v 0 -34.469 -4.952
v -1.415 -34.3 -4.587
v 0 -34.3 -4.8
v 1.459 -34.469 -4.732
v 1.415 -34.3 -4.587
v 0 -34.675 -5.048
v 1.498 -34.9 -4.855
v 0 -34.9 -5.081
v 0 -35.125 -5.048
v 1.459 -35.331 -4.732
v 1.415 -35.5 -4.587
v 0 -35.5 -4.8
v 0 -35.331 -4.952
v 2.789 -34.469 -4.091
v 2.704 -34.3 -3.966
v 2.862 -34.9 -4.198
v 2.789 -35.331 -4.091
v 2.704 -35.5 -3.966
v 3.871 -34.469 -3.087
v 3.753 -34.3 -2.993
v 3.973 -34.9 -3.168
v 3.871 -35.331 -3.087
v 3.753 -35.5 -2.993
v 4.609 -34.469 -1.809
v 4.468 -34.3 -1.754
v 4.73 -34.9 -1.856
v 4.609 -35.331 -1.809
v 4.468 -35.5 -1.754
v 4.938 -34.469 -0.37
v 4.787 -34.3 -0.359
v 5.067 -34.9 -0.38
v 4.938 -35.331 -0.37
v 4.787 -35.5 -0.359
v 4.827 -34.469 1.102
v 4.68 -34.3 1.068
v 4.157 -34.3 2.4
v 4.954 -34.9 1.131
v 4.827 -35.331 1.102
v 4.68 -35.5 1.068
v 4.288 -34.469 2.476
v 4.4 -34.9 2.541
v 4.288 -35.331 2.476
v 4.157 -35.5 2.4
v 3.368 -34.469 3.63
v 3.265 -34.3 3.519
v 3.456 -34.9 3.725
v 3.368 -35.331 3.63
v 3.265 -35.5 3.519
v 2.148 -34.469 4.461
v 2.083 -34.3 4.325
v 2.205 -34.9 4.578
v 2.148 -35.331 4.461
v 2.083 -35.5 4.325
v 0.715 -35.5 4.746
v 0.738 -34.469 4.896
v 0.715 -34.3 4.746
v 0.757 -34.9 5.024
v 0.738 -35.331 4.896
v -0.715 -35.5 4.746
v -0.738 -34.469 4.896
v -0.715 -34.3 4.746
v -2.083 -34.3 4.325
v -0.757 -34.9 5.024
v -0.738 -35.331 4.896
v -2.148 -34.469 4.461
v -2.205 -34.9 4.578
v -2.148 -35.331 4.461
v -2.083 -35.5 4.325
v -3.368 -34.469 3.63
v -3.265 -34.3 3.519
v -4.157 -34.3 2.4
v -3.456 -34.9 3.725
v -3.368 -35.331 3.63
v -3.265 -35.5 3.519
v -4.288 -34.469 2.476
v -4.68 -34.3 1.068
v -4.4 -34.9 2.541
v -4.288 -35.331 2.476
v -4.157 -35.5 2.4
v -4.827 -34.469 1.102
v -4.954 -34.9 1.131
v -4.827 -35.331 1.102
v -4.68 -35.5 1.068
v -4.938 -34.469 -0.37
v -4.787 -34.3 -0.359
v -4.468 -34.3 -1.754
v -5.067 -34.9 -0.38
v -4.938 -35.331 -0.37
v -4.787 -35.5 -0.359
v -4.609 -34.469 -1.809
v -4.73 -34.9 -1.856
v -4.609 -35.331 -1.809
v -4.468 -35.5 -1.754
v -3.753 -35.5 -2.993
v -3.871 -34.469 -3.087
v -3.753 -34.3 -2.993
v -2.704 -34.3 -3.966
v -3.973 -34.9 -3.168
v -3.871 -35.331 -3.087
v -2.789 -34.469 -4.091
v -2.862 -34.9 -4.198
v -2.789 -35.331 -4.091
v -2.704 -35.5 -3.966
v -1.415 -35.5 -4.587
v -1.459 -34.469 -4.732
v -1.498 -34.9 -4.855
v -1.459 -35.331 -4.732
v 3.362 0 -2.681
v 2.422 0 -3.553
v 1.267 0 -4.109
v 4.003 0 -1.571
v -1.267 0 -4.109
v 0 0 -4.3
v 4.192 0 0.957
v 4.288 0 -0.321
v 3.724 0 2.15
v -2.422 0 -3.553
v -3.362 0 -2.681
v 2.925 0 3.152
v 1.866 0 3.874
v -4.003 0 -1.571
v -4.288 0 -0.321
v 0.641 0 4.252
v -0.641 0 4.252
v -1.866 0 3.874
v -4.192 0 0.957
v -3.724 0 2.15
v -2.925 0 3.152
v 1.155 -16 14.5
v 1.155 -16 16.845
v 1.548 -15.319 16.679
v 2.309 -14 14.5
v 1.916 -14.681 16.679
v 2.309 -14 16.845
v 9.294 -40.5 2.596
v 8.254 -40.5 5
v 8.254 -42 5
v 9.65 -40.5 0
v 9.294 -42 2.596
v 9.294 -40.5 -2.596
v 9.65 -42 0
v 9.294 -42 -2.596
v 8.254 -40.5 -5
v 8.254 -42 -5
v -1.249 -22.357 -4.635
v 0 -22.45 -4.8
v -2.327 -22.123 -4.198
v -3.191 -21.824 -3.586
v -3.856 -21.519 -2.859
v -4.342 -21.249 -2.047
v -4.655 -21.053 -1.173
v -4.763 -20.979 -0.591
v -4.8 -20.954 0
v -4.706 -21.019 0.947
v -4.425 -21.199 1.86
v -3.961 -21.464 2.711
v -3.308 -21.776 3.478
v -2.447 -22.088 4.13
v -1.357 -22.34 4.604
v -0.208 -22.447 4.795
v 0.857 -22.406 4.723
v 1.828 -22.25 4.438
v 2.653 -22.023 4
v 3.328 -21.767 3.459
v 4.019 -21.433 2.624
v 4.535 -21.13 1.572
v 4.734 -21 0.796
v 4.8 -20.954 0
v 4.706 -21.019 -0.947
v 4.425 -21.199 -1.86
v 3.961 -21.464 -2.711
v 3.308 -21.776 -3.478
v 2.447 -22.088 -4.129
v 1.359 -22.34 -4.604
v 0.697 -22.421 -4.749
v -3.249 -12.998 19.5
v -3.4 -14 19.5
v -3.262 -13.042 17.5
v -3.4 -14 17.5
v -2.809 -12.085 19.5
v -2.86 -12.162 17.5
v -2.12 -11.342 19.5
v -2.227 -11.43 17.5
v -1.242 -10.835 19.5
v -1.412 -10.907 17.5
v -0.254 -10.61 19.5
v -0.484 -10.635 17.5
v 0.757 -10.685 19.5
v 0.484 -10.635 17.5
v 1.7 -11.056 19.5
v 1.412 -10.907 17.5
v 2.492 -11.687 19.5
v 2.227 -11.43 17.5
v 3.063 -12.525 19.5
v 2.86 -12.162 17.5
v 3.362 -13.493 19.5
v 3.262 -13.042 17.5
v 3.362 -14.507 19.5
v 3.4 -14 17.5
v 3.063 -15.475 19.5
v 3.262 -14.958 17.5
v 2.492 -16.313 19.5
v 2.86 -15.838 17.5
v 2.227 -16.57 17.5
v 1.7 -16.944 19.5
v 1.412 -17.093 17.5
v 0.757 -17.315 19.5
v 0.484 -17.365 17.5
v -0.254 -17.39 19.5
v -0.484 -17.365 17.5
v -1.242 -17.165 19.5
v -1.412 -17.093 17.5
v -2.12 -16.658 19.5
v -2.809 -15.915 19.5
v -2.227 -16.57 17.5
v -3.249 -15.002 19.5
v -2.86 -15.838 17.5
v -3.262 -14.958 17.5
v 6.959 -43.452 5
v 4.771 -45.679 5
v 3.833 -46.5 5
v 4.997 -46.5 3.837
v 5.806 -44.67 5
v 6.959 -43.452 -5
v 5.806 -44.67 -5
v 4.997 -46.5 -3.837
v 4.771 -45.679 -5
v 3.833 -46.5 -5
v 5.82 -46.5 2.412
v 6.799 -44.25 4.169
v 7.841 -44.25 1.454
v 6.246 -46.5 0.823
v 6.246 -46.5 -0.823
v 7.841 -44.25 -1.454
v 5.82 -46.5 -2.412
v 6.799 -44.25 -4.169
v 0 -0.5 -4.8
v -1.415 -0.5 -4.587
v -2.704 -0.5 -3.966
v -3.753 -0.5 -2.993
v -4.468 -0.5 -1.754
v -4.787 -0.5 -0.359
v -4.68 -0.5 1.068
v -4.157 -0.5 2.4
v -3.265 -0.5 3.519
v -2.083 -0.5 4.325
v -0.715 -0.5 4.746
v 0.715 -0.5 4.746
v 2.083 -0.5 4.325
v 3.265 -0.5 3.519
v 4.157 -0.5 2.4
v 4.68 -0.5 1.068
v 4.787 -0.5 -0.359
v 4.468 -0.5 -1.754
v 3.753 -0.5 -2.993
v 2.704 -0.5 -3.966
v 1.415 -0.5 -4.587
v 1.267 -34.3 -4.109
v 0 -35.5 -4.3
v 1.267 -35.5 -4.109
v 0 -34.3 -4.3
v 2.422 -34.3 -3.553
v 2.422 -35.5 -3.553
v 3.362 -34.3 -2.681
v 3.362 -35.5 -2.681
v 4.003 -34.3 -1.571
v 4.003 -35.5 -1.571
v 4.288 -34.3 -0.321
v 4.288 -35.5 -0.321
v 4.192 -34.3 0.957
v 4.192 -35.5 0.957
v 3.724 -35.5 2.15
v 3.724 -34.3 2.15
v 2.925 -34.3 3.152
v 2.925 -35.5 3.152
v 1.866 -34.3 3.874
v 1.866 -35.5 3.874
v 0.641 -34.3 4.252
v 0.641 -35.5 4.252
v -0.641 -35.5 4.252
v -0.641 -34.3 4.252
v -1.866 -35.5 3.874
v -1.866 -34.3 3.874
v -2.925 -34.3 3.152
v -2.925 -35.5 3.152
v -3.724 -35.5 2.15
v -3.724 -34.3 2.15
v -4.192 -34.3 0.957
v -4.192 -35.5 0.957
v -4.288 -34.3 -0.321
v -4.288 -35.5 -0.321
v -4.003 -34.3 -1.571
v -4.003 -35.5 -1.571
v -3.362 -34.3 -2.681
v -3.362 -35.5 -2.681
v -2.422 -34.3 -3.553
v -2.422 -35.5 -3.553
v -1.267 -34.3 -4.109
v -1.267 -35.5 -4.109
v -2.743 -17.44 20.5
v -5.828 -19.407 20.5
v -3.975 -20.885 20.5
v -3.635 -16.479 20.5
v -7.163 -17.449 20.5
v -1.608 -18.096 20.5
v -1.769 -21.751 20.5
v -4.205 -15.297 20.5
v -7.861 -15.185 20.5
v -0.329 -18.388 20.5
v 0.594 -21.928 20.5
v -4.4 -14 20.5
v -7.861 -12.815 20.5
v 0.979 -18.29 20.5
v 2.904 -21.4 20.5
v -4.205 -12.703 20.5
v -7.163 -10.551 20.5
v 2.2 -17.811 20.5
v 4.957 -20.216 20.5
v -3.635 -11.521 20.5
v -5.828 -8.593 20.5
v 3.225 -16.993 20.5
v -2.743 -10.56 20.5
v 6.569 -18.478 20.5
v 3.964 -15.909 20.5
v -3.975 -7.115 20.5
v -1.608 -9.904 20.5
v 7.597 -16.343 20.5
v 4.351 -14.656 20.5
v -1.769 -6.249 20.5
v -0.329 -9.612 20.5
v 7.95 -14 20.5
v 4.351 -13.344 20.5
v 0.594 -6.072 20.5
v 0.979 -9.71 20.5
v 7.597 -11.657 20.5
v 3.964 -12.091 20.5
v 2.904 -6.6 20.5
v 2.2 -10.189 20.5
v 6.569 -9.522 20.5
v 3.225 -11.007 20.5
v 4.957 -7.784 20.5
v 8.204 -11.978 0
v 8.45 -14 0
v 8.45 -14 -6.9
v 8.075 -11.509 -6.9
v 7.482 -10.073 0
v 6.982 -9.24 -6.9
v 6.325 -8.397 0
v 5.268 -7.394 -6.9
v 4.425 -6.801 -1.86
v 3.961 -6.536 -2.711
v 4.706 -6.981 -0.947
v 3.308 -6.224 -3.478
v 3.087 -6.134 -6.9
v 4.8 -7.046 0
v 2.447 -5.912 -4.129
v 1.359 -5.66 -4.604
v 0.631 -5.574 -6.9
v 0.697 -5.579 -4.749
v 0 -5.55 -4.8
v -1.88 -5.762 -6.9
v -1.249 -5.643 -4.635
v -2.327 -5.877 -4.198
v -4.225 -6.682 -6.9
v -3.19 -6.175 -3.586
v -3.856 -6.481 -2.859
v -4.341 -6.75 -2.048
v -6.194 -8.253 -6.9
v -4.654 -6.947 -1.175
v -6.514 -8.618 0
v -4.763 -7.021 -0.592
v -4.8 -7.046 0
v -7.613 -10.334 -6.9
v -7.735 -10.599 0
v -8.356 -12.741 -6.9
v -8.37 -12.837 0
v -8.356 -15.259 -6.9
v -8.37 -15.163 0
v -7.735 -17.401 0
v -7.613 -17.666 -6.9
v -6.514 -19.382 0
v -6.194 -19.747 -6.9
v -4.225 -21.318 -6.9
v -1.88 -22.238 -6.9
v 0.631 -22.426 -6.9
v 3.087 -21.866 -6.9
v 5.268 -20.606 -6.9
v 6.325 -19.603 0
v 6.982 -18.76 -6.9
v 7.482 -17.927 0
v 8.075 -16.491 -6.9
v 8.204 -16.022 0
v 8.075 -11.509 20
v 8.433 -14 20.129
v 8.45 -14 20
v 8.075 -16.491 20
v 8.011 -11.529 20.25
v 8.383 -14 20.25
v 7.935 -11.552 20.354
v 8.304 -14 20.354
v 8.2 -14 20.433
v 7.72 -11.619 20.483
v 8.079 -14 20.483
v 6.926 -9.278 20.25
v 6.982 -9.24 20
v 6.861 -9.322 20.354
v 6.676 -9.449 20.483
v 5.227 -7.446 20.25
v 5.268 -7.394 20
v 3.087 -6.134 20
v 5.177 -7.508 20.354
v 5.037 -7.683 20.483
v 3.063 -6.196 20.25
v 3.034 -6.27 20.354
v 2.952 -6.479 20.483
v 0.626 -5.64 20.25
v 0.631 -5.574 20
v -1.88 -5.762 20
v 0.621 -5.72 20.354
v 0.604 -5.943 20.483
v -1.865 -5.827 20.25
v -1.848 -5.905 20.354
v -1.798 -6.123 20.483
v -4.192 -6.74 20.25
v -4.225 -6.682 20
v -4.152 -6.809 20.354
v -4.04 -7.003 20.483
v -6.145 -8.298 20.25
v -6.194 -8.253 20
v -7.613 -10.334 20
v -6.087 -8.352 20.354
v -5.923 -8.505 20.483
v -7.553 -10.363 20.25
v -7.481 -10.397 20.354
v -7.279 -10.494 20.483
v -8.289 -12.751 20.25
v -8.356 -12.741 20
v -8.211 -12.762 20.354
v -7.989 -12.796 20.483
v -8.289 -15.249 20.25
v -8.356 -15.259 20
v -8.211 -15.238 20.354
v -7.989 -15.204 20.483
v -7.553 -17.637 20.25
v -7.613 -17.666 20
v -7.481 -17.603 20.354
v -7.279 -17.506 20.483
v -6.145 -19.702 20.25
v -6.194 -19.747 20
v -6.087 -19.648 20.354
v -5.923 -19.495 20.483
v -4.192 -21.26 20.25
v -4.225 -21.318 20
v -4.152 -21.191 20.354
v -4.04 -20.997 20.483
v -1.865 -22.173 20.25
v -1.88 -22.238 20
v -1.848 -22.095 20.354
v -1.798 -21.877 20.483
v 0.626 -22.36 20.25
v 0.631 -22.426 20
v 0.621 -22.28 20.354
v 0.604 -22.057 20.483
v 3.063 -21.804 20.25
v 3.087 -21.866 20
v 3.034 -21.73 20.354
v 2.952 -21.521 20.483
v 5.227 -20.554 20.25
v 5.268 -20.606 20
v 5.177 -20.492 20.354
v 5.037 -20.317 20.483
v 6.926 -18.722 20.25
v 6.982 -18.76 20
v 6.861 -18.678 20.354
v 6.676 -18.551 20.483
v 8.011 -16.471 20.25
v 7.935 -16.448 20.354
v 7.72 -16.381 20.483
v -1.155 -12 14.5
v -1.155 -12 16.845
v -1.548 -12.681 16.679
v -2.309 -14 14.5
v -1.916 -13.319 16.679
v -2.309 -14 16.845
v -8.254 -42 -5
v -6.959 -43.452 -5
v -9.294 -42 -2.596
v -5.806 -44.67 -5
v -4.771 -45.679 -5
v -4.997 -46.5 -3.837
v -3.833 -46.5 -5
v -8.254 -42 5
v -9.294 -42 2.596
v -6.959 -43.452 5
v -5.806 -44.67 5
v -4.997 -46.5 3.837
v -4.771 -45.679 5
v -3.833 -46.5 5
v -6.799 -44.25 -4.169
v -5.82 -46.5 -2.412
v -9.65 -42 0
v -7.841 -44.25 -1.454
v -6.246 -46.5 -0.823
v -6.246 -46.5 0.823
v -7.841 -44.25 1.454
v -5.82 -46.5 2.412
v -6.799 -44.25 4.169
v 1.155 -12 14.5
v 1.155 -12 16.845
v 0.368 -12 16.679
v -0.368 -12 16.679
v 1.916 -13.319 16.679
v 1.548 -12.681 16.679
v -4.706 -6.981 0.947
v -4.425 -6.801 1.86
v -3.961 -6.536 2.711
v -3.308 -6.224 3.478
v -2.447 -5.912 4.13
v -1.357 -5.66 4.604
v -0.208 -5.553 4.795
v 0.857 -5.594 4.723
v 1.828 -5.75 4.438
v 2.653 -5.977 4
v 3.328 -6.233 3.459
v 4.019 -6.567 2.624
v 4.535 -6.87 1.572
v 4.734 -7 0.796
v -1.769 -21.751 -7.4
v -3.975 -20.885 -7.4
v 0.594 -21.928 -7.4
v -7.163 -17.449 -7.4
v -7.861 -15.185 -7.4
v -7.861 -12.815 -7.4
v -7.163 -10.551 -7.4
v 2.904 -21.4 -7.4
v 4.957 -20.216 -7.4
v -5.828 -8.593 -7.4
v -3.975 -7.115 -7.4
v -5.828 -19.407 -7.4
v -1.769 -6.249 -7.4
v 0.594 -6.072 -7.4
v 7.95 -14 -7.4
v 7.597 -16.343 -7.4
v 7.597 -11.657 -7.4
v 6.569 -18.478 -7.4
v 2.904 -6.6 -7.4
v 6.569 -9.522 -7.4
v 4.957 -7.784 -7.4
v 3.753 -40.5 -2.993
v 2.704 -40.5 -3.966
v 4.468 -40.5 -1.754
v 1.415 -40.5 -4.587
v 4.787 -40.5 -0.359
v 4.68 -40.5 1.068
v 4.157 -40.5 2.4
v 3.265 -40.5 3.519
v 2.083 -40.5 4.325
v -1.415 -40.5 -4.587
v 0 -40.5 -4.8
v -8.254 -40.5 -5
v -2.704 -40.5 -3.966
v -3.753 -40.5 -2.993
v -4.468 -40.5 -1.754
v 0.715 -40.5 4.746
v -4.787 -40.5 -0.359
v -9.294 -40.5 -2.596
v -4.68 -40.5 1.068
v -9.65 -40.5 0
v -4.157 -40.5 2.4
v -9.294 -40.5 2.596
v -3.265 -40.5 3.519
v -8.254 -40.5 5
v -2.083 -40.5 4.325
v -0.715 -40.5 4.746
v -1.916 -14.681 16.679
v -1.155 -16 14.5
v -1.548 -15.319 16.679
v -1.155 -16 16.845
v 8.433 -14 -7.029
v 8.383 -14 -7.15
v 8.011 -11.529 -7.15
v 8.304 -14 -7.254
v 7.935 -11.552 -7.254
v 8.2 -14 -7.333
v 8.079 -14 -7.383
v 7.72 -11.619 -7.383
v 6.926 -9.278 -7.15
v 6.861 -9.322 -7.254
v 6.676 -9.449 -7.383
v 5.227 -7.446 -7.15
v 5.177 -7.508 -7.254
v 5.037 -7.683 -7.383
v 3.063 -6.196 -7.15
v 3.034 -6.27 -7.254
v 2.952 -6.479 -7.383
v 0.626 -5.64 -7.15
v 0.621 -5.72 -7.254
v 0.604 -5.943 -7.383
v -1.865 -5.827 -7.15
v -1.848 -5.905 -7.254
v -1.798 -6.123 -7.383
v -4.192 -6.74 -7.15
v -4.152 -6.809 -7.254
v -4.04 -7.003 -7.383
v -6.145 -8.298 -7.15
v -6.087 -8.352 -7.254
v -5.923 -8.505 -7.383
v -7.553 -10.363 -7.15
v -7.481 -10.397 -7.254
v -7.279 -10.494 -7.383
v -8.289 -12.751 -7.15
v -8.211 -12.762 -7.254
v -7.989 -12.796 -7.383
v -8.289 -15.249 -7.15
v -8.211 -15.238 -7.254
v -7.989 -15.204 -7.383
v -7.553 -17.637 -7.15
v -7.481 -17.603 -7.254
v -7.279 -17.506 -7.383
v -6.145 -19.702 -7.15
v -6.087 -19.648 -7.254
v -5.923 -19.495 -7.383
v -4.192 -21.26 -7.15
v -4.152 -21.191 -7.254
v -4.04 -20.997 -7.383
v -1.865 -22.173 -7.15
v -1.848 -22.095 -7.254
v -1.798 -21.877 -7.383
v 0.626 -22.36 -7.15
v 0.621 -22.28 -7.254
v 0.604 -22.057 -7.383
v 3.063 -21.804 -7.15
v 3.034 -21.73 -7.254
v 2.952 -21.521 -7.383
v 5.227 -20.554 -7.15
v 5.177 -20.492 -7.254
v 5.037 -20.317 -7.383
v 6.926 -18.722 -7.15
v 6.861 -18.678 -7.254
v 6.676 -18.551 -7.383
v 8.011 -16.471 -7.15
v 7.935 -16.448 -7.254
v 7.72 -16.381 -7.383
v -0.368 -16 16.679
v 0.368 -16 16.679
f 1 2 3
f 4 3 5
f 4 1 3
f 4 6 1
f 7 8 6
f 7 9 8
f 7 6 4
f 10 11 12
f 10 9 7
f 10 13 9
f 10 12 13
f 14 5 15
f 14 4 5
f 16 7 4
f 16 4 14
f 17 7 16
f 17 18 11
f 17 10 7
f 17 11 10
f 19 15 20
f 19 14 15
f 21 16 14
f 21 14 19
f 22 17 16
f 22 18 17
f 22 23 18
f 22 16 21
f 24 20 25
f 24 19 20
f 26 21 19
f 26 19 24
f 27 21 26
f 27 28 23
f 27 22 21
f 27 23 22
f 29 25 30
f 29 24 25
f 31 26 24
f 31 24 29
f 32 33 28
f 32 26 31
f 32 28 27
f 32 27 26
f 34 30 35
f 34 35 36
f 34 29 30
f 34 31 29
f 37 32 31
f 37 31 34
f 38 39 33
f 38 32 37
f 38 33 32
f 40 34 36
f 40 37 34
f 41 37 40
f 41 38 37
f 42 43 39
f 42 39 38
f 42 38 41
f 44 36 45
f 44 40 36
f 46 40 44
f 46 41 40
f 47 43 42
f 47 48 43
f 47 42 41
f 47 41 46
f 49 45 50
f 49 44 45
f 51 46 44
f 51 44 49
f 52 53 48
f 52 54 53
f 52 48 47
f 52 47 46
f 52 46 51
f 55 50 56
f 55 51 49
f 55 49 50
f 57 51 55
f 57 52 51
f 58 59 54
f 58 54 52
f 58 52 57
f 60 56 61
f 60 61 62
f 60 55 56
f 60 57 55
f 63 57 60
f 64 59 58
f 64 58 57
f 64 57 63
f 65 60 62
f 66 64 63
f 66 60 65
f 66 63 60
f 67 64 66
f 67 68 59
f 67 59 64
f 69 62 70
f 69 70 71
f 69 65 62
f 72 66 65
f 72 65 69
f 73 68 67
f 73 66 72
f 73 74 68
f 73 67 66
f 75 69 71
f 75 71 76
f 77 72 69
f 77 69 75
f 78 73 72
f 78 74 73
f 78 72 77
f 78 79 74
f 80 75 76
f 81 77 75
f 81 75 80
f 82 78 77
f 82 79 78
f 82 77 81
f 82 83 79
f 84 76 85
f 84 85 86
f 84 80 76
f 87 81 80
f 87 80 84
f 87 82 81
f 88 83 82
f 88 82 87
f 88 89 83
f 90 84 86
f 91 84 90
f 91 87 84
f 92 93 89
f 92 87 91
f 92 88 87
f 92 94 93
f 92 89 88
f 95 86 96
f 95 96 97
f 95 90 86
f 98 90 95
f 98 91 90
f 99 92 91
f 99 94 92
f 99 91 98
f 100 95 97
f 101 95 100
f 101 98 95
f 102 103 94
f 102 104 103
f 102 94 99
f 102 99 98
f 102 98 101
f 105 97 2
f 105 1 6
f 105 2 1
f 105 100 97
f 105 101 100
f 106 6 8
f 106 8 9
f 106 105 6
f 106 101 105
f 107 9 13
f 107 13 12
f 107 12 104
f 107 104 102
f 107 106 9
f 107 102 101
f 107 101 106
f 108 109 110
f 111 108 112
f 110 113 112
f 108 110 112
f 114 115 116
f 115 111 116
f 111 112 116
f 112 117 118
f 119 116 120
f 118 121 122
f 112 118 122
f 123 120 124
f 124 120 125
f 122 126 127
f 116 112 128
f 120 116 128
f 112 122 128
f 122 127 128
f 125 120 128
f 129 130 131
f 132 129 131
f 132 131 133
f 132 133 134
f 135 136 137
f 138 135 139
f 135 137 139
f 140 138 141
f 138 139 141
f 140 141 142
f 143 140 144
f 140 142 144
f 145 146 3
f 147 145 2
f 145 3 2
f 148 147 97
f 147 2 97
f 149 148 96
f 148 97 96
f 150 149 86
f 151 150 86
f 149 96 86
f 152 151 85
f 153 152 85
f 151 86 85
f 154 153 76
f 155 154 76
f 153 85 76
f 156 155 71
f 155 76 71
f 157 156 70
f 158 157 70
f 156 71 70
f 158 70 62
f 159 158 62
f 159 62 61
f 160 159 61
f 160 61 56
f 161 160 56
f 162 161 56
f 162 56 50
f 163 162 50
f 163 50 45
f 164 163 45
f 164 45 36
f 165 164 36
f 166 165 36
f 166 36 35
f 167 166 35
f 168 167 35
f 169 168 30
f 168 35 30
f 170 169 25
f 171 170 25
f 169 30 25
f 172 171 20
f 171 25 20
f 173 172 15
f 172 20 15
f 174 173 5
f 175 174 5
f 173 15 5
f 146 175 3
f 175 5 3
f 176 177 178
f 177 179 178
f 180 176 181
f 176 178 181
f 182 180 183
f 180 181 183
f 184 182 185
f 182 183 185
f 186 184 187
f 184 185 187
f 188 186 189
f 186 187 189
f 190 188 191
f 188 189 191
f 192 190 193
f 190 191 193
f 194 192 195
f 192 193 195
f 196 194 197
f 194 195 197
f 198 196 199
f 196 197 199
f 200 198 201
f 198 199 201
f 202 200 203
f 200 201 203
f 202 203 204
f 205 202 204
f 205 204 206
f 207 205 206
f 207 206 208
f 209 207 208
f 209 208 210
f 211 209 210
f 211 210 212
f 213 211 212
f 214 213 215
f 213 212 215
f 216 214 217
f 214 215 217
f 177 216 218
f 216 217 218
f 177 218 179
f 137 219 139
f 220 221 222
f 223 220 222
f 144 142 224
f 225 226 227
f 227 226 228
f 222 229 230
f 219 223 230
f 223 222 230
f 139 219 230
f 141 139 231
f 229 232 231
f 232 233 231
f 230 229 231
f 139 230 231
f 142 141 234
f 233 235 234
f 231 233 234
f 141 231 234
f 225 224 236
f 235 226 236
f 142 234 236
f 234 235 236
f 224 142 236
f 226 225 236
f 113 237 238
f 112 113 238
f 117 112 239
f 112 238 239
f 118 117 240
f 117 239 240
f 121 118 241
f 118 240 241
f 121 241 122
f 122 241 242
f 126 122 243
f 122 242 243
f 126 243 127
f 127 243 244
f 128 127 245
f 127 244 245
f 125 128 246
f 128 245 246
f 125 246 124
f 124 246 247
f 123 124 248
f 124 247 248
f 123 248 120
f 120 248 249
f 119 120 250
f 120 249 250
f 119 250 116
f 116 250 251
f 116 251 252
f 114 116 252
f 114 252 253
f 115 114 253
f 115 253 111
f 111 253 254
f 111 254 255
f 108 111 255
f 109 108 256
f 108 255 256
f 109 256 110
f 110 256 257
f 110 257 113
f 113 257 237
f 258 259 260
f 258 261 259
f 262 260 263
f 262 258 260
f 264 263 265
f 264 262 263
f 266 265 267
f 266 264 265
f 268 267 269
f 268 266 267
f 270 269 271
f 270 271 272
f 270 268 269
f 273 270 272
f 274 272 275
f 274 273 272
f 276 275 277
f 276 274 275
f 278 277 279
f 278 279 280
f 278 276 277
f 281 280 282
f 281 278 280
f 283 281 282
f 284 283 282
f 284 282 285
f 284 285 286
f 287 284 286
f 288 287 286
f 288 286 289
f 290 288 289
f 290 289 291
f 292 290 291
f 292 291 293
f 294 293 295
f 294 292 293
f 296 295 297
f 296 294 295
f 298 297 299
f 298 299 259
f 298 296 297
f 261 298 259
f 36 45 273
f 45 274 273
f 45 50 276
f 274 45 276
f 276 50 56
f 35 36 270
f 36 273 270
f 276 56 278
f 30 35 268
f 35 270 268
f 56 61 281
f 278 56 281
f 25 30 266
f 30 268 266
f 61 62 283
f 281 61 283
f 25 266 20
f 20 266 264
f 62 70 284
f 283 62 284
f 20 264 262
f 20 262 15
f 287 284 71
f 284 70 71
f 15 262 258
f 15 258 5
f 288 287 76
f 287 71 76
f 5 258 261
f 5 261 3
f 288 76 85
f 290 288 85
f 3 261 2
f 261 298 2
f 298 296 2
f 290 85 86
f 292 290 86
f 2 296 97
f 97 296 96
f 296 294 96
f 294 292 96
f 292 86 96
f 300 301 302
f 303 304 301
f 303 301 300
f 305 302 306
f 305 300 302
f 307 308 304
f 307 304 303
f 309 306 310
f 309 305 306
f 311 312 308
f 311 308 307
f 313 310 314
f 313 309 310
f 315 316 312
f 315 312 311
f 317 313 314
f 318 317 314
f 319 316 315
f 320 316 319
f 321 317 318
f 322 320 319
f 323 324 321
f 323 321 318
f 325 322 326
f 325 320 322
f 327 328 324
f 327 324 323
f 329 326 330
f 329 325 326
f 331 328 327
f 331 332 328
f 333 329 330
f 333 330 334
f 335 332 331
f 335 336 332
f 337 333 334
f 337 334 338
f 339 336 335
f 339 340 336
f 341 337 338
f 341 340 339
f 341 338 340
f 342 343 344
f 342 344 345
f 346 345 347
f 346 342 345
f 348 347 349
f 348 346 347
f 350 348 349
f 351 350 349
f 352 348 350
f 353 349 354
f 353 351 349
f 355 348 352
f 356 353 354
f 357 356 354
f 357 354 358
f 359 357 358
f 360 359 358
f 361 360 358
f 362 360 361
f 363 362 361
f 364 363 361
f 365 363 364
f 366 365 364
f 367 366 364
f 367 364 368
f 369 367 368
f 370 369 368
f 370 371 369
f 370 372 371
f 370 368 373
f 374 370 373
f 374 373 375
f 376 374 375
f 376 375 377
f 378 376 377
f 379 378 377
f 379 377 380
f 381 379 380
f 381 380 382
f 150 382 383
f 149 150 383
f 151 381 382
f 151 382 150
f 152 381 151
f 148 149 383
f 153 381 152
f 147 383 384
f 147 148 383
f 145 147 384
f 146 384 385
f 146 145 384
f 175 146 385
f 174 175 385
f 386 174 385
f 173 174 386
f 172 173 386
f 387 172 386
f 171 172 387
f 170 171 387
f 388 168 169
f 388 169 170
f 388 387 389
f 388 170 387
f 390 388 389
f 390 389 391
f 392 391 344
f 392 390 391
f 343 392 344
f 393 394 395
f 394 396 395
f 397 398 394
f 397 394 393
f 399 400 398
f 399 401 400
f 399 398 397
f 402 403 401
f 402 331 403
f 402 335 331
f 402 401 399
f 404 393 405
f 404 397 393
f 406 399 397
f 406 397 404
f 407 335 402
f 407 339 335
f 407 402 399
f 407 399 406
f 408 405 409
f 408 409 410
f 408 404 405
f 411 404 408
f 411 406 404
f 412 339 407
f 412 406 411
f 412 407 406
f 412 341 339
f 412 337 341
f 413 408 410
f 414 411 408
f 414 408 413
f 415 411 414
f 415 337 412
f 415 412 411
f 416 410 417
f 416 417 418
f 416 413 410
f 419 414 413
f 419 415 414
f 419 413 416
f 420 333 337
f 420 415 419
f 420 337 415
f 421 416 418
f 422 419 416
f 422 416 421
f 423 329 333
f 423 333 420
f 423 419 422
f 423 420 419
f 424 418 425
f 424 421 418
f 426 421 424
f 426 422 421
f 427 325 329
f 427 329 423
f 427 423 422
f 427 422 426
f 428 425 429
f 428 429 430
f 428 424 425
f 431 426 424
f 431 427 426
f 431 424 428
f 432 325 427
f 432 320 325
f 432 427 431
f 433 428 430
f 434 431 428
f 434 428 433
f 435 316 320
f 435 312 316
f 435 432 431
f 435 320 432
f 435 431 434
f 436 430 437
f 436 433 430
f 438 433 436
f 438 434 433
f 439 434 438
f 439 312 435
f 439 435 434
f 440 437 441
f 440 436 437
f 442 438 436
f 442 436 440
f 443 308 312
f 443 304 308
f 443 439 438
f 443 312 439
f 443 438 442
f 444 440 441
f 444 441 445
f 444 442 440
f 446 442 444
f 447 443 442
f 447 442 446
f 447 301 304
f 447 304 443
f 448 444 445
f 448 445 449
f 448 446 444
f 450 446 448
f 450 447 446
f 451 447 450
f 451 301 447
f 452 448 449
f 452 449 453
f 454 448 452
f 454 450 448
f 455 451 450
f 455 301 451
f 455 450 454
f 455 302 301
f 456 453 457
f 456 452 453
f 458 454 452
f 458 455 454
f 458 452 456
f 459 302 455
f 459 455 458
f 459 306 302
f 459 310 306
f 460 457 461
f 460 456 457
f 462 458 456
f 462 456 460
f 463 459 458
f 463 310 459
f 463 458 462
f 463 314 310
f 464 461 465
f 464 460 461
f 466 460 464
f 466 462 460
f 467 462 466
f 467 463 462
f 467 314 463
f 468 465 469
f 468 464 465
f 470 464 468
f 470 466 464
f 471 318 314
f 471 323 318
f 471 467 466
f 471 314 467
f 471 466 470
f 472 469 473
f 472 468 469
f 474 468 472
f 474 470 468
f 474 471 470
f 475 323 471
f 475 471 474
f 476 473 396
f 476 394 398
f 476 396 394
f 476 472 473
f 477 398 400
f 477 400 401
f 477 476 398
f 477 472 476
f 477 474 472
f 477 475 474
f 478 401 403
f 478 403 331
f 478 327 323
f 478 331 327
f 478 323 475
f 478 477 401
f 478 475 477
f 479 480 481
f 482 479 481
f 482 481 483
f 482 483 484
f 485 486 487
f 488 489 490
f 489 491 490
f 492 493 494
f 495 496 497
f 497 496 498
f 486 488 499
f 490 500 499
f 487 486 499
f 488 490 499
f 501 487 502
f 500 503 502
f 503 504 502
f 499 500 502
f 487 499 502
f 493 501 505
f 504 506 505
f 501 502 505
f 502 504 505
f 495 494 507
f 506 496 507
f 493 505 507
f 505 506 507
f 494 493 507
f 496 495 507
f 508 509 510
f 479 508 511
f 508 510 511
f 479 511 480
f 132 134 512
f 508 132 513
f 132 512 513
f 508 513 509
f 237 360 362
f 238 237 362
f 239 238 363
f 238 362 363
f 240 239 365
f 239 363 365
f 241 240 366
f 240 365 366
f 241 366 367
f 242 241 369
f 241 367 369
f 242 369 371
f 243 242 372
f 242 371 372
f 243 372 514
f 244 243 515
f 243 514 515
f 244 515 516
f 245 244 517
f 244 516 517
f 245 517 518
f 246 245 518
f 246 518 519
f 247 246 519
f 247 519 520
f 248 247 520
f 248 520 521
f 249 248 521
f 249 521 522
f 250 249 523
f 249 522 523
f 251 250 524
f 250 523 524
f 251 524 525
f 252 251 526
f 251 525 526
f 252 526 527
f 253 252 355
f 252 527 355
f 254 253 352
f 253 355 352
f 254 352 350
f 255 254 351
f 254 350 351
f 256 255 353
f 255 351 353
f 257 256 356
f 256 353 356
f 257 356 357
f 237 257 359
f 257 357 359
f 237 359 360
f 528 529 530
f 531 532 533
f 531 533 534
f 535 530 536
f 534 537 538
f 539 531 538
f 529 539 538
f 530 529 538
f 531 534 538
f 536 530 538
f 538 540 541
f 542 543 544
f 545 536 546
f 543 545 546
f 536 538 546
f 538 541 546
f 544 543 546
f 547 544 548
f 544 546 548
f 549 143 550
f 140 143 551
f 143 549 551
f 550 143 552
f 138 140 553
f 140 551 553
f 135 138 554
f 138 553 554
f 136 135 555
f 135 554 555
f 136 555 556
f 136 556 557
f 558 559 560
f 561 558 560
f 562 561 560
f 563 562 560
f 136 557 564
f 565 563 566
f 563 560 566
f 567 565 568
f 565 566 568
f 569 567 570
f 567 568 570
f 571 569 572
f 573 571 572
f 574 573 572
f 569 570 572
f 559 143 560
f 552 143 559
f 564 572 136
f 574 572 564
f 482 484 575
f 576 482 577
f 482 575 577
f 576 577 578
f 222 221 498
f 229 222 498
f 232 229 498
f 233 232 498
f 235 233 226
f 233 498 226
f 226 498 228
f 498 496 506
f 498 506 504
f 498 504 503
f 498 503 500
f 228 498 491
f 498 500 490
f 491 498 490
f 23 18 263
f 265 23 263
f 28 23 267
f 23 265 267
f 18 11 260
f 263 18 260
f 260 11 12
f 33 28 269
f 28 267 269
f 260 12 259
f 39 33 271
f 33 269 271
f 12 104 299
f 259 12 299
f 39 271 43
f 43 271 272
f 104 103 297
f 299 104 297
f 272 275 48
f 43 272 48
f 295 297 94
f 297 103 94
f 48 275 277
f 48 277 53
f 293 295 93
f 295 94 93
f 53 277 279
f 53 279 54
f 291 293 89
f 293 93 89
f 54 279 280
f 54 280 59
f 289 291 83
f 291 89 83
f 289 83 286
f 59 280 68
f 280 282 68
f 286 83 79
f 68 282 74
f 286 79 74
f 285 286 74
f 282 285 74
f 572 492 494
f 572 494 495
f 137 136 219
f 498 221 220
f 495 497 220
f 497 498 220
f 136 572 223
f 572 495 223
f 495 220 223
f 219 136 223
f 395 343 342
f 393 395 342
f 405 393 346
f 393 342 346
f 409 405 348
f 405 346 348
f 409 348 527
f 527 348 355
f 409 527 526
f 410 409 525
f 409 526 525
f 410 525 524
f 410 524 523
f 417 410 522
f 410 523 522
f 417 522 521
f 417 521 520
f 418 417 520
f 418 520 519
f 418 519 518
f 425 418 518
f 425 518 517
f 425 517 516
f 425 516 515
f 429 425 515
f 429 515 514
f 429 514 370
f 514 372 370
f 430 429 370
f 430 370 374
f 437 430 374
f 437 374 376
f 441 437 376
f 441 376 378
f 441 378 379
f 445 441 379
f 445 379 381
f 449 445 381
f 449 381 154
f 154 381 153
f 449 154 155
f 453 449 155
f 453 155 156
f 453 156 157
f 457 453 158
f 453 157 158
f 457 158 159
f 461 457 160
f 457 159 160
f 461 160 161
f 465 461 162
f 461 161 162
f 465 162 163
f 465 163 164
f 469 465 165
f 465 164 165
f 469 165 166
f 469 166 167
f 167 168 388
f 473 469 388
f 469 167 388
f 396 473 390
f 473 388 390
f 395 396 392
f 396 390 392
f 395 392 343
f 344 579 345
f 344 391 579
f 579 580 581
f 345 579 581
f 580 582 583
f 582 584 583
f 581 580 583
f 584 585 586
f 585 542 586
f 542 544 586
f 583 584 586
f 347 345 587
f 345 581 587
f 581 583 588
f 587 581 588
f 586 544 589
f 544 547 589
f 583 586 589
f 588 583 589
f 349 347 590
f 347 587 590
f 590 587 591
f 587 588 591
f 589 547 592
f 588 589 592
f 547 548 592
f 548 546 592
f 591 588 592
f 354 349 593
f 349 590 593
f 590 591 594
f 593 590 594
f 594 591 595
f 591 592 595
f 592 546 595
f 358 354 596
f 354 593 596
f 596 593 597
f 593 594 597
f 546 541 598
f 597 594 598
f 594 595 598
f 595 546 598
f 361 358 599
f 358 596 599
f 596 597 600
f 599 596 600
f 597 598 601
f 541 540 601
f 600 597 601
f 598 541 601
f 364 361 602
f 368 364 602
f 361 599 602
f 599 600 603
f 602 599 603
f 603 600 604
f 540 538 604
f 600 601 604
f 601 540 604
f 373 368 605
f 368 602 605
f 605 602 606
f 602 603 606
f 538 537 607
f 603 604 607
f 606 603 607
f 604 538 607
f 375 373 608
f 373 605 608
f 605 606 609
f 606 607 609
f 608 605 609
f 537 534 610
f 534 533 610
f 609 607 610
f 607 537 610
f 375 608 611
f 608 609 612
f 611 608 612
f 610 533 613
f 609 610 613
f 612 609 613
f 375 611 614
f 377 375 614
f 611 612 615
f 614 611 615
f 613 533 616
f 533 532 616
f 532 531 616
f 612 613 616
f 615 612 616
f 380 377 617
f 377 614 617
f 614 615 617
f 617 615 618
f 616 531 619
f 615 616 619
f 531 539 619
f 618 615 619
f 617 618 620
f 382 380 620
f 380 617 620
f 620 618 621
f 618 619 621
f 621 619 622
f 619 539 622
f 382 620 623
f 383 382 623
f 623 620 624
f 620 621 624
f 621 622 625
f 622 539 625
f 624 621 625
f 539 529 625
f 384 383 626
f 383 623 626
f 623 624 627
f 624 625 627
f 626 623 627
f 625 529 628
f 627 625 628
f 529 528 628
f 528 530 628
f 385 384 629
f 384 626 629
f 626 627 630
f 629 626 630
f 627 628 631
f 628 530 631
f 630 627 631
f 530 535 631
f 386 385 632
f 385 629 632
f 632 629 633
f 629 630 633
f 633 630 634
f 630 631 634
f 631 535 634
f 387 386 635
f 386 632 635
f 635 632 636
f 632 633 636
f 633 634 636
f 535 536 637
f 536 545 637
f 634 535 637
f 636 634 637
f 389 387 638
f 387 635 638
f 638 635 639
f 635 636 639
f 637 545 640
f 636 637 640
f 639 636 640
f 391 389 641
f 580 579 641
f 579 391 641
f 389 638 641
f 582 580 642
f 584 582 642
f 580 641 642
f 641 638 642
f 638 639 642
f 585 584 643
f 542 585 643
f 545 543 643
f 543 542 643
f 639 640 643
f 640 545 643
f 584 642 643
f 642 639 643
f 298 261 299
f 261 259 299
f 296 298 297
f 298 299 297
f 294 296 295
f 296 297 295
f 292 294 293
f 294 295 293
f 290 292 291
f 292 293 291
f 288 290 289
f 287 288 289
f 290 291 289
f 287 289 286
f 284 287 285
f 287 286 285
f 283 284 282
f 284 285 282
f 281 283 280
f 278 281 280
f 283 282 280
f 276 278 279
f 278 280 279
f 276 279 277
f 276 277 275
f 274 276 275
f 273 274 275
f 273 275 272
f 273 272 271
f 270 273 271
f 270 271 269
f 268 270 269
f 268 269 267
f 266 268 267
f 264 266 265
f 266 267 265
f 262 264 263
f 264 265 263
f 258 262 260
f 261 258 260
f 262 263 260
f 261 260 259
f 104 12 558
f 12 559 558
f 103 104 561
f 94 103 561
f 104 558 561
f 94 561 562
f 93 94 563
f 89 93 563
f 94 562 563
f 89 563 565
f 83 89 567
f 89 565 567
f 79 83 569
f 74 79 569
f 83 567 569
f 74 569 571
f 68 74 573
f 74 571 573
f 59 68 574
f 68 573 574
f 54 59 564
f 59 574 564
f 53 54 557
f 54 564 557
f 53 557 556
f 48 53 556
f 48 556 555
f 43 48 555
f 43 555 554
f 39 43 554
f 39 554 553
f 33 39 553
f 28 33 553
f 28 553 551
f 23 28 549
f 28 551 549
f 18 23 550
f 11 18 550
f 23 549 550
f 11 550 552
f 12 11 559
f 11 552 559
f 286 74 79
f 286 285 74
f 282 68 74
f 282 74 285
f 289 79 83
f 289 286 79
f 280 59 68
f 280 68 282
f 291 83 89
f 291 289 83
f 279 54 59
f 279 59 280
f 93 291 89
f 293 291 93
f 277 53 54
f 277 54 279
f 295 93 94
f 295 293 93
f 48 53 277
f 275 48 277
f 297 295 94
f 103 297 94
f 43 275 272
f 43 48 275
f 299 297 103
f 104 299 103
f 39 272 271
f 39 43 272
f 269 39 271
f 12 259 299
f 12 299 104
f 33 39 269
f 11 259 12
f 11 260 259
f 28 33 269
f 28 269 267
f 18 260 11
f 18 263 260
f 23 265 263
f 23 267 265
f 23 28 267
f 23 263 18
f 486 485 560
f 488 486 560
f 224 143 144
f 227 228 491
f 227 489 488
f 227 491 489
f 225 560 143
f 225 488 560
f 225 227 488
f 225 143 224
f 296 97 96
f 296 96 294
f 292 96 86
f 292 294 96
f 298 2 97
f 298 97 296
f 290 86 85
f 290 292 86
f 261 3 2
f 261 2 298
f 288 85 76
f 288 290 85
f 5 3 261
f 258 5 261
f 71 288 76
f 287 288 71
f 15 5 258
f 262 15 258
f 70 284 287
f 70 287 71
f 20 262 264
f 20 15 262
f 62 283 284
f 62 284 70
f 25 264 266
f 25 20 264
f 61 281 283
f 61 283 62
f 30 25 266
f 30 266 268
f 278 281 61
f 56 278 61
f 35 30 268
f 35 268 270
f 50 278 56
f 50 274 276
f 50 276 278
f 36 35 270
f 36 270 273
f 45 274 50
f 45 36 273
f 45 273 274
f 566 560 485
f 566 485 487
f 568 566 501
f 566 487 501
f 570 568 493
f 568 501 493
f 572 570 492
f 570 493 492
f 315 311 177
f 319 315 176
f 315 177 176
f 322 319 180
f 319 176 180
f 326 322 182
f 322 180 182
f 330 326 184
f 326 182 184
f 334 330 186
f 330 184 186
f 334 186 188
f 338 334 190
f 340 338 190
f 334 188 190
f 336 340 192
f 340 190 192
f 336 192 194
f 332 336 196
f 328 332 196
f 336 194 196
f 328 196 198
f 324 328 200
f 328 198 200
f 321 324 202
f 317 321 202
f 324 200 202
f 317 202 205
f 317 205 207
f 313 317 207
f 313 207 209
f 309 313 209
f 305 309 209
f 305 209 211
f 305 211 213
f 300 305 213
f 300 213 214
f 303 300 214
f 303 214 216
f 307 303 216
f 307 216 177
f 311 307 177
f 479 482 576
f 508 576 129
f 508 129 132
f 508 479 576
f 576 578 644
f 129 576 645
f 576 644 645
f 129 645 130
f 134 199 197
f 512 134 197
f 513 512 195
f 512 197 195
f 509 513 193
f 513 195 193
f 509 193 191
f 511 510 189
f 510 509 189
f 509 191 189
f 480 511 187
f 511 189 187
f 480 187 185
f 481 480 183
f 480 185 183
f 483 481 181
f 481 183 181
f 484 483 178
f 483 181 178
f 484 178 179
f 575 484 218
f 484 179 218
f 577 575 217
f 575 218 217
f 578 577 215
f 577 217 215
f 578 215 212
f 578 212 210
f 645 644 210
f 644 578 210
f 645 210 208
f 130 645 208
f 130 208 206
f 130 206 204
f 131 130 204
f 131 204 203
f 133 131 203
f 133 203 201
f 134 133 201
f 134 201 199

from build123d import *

# Parameters (mm, degrees)
SKETCH_6_OUTSIDE_W          = 32.084
SKETCH_6_OUTSIDE_H          = 32.084
SKETCH_6_OUTSIDE_W_2        = 19.3
SKETCH_6_OUTSIDE_H_2        = 10
CUT_EXTRUDE_1_DEPTH         = 6
CHAMFER_1_SIZE              = 0.5
SKETCH_12_R                 = 8.45
EXTRUDE_2_DEPTH             = 20.5
EXTRUDE_2_DEPTH_BACK        = 7.4
HOLE_WIZARD_M81_D           = 6.8
HOLE_WIZARD_M81_DEPTH       = 3
HOLE_WIZARD_M81_CSINK_D     = 8.8
HOLE_WIZARD_M81_CSINK_ANGLE = 90
HOLE_WIZARD_M81_TIP         = 2.042926105
FILLET_1_R                  = 0.5
CUT_EXTRUDE_2_DEPTH         = 6


with BuildPart() as part:
    # Эскиз3 → Повернуть1 (revolve)
    with BuildSketch(Plane.XY, mode=Mode.PRIVATE) as revolve_1_sk:
        Polygon((0, 0), (-4.8, 0), (-4.8, -34.3), (-4.3, -34.3), (-4.3, -35.5), (-4.8, -35.5), (-4.8, -40.5), (-9.65, -40.5), (-9.65, -42), (-6.3, -46.5), (0, -46.5), align=None)
    revolve(revolve_1_sk.sketch.rotate(Axis((0, 0, 0), (0, 1, 0)), 270), axis=Axis((0, 0, 0), (0, 1, 0)))  # turned: the seam where the file's is

    # Эскиз6 outside → Вырез-Вытянуть1 (cut)
    with BuildSketch(Plane.XZ.offset(46.5)):
        Rectangle(SKETCH_6_OUTSIDE_W, SKETCH_6_OUTSIDE_H)
        Rectangle(SKETCH_6_OUTSIDE_W_2, SKETCH_6_OUTSIDE_H_2, mode=Mode.SUBTRACT)
    extrude(amount=-CUT_EXTRUDE_1_DEPTH, mode=Mode.SUBTRACT)

    # Фаска1
    chamfer_1_edges = [part.edges().sort_by_distance(p)[0] for p in [
        (0, 0, 4.8),
    ]]
    chamfer(chamfer_1_edges, length=CHAMFER_1_SIZE)

    # Эскиз12 → Бобышка-Вытянуть2 (add, two sides)
    with BuildSketch(Plane.XY) as extrude_2_sk:
        with Locations((0, -14)):
            Circle(SKETCH_12_R)
    extrude(amount=EXTRUDE_2_DEPTH)
    extrude(extrude_2_sk.sketch, amount=-EXTRUDE_2_DEPTH_BACK)

    # Отверстие обработанное метчиком M81
    with Locations(Plane.XY.offset(20.5)):
        with Locations((0, -14)):
            CounterSinkHole(HOLE_WIZARD_M81_D / 2, HOLE_WIZARD_M81_CSINK_D / 2, depth=HOLE_WIZARD_M81_DEPTH, counter_sink_angle=HOLE_WIZARD_M81_CSINK_ANGLE)
            with Locations((0, 0, -(HOLE_WIZARD_M81_DEPTH + HOLE_WIZARD_M81_TIP / 2))):  # 118° drill point
                Cone(0, HOLE_WIZARD_M81_D / 2, HOLE_WIZARD_M81_TIP, mode=Mode.SUBTRACT)

    # Скругление1
    fillet_1_edges = [part.edges().sort_by_distance(p)[0] for p in [
        (-8.45, -14, -7.4),
        (-8.45, -14, 20.5),
    ]]
    fillet(fillet_1_edges, radius=FILLET_1_R)

    # Эскиз15 → Вырез-Вытянуть2 (cut)
    with BuildSketch(Plane.XY.offset(20.5)):
        Polygon((2.309401077, -14), (1.154700538, -12), (-1.154700538, -12), (-2.309401077, -14), (-1.154700538, -16), (1.154700538, -16), align=None)
    extrude(amount=-CUT_EXTRUDE_2_DEPTH, mode=Mode.SUBTRACT)


with BuildPart() as body_2:
    # Эскиз16 → Повернуть2 (revolve)
    with BuildSketch(Plane.XY, mode=Mode.PRIVATE) as revolve_2_sk:
        with BuildLine():
            Line((-4.3, -34.3), (-4.8, -34.3))
            ThreePointArc((-4.8, -34.3), (-5.081024968, -34.9), (-4.8, -35.5))
            Line((-4.8, -35.5), (-4.3, -35.5))
            Line((-4.3, -35.5), (-4.3, -34.3))
        make_face()
    revolve(revolve_2_sk.sketch.rotate(Axis((0, -34.3, 0), (0, -1, 0)), 90), axis=Axis((0, -34.3, 0), (0, -1, 0)))  # turned: the seam where the file's is


solid = Compound([part.part, body_2.part])
